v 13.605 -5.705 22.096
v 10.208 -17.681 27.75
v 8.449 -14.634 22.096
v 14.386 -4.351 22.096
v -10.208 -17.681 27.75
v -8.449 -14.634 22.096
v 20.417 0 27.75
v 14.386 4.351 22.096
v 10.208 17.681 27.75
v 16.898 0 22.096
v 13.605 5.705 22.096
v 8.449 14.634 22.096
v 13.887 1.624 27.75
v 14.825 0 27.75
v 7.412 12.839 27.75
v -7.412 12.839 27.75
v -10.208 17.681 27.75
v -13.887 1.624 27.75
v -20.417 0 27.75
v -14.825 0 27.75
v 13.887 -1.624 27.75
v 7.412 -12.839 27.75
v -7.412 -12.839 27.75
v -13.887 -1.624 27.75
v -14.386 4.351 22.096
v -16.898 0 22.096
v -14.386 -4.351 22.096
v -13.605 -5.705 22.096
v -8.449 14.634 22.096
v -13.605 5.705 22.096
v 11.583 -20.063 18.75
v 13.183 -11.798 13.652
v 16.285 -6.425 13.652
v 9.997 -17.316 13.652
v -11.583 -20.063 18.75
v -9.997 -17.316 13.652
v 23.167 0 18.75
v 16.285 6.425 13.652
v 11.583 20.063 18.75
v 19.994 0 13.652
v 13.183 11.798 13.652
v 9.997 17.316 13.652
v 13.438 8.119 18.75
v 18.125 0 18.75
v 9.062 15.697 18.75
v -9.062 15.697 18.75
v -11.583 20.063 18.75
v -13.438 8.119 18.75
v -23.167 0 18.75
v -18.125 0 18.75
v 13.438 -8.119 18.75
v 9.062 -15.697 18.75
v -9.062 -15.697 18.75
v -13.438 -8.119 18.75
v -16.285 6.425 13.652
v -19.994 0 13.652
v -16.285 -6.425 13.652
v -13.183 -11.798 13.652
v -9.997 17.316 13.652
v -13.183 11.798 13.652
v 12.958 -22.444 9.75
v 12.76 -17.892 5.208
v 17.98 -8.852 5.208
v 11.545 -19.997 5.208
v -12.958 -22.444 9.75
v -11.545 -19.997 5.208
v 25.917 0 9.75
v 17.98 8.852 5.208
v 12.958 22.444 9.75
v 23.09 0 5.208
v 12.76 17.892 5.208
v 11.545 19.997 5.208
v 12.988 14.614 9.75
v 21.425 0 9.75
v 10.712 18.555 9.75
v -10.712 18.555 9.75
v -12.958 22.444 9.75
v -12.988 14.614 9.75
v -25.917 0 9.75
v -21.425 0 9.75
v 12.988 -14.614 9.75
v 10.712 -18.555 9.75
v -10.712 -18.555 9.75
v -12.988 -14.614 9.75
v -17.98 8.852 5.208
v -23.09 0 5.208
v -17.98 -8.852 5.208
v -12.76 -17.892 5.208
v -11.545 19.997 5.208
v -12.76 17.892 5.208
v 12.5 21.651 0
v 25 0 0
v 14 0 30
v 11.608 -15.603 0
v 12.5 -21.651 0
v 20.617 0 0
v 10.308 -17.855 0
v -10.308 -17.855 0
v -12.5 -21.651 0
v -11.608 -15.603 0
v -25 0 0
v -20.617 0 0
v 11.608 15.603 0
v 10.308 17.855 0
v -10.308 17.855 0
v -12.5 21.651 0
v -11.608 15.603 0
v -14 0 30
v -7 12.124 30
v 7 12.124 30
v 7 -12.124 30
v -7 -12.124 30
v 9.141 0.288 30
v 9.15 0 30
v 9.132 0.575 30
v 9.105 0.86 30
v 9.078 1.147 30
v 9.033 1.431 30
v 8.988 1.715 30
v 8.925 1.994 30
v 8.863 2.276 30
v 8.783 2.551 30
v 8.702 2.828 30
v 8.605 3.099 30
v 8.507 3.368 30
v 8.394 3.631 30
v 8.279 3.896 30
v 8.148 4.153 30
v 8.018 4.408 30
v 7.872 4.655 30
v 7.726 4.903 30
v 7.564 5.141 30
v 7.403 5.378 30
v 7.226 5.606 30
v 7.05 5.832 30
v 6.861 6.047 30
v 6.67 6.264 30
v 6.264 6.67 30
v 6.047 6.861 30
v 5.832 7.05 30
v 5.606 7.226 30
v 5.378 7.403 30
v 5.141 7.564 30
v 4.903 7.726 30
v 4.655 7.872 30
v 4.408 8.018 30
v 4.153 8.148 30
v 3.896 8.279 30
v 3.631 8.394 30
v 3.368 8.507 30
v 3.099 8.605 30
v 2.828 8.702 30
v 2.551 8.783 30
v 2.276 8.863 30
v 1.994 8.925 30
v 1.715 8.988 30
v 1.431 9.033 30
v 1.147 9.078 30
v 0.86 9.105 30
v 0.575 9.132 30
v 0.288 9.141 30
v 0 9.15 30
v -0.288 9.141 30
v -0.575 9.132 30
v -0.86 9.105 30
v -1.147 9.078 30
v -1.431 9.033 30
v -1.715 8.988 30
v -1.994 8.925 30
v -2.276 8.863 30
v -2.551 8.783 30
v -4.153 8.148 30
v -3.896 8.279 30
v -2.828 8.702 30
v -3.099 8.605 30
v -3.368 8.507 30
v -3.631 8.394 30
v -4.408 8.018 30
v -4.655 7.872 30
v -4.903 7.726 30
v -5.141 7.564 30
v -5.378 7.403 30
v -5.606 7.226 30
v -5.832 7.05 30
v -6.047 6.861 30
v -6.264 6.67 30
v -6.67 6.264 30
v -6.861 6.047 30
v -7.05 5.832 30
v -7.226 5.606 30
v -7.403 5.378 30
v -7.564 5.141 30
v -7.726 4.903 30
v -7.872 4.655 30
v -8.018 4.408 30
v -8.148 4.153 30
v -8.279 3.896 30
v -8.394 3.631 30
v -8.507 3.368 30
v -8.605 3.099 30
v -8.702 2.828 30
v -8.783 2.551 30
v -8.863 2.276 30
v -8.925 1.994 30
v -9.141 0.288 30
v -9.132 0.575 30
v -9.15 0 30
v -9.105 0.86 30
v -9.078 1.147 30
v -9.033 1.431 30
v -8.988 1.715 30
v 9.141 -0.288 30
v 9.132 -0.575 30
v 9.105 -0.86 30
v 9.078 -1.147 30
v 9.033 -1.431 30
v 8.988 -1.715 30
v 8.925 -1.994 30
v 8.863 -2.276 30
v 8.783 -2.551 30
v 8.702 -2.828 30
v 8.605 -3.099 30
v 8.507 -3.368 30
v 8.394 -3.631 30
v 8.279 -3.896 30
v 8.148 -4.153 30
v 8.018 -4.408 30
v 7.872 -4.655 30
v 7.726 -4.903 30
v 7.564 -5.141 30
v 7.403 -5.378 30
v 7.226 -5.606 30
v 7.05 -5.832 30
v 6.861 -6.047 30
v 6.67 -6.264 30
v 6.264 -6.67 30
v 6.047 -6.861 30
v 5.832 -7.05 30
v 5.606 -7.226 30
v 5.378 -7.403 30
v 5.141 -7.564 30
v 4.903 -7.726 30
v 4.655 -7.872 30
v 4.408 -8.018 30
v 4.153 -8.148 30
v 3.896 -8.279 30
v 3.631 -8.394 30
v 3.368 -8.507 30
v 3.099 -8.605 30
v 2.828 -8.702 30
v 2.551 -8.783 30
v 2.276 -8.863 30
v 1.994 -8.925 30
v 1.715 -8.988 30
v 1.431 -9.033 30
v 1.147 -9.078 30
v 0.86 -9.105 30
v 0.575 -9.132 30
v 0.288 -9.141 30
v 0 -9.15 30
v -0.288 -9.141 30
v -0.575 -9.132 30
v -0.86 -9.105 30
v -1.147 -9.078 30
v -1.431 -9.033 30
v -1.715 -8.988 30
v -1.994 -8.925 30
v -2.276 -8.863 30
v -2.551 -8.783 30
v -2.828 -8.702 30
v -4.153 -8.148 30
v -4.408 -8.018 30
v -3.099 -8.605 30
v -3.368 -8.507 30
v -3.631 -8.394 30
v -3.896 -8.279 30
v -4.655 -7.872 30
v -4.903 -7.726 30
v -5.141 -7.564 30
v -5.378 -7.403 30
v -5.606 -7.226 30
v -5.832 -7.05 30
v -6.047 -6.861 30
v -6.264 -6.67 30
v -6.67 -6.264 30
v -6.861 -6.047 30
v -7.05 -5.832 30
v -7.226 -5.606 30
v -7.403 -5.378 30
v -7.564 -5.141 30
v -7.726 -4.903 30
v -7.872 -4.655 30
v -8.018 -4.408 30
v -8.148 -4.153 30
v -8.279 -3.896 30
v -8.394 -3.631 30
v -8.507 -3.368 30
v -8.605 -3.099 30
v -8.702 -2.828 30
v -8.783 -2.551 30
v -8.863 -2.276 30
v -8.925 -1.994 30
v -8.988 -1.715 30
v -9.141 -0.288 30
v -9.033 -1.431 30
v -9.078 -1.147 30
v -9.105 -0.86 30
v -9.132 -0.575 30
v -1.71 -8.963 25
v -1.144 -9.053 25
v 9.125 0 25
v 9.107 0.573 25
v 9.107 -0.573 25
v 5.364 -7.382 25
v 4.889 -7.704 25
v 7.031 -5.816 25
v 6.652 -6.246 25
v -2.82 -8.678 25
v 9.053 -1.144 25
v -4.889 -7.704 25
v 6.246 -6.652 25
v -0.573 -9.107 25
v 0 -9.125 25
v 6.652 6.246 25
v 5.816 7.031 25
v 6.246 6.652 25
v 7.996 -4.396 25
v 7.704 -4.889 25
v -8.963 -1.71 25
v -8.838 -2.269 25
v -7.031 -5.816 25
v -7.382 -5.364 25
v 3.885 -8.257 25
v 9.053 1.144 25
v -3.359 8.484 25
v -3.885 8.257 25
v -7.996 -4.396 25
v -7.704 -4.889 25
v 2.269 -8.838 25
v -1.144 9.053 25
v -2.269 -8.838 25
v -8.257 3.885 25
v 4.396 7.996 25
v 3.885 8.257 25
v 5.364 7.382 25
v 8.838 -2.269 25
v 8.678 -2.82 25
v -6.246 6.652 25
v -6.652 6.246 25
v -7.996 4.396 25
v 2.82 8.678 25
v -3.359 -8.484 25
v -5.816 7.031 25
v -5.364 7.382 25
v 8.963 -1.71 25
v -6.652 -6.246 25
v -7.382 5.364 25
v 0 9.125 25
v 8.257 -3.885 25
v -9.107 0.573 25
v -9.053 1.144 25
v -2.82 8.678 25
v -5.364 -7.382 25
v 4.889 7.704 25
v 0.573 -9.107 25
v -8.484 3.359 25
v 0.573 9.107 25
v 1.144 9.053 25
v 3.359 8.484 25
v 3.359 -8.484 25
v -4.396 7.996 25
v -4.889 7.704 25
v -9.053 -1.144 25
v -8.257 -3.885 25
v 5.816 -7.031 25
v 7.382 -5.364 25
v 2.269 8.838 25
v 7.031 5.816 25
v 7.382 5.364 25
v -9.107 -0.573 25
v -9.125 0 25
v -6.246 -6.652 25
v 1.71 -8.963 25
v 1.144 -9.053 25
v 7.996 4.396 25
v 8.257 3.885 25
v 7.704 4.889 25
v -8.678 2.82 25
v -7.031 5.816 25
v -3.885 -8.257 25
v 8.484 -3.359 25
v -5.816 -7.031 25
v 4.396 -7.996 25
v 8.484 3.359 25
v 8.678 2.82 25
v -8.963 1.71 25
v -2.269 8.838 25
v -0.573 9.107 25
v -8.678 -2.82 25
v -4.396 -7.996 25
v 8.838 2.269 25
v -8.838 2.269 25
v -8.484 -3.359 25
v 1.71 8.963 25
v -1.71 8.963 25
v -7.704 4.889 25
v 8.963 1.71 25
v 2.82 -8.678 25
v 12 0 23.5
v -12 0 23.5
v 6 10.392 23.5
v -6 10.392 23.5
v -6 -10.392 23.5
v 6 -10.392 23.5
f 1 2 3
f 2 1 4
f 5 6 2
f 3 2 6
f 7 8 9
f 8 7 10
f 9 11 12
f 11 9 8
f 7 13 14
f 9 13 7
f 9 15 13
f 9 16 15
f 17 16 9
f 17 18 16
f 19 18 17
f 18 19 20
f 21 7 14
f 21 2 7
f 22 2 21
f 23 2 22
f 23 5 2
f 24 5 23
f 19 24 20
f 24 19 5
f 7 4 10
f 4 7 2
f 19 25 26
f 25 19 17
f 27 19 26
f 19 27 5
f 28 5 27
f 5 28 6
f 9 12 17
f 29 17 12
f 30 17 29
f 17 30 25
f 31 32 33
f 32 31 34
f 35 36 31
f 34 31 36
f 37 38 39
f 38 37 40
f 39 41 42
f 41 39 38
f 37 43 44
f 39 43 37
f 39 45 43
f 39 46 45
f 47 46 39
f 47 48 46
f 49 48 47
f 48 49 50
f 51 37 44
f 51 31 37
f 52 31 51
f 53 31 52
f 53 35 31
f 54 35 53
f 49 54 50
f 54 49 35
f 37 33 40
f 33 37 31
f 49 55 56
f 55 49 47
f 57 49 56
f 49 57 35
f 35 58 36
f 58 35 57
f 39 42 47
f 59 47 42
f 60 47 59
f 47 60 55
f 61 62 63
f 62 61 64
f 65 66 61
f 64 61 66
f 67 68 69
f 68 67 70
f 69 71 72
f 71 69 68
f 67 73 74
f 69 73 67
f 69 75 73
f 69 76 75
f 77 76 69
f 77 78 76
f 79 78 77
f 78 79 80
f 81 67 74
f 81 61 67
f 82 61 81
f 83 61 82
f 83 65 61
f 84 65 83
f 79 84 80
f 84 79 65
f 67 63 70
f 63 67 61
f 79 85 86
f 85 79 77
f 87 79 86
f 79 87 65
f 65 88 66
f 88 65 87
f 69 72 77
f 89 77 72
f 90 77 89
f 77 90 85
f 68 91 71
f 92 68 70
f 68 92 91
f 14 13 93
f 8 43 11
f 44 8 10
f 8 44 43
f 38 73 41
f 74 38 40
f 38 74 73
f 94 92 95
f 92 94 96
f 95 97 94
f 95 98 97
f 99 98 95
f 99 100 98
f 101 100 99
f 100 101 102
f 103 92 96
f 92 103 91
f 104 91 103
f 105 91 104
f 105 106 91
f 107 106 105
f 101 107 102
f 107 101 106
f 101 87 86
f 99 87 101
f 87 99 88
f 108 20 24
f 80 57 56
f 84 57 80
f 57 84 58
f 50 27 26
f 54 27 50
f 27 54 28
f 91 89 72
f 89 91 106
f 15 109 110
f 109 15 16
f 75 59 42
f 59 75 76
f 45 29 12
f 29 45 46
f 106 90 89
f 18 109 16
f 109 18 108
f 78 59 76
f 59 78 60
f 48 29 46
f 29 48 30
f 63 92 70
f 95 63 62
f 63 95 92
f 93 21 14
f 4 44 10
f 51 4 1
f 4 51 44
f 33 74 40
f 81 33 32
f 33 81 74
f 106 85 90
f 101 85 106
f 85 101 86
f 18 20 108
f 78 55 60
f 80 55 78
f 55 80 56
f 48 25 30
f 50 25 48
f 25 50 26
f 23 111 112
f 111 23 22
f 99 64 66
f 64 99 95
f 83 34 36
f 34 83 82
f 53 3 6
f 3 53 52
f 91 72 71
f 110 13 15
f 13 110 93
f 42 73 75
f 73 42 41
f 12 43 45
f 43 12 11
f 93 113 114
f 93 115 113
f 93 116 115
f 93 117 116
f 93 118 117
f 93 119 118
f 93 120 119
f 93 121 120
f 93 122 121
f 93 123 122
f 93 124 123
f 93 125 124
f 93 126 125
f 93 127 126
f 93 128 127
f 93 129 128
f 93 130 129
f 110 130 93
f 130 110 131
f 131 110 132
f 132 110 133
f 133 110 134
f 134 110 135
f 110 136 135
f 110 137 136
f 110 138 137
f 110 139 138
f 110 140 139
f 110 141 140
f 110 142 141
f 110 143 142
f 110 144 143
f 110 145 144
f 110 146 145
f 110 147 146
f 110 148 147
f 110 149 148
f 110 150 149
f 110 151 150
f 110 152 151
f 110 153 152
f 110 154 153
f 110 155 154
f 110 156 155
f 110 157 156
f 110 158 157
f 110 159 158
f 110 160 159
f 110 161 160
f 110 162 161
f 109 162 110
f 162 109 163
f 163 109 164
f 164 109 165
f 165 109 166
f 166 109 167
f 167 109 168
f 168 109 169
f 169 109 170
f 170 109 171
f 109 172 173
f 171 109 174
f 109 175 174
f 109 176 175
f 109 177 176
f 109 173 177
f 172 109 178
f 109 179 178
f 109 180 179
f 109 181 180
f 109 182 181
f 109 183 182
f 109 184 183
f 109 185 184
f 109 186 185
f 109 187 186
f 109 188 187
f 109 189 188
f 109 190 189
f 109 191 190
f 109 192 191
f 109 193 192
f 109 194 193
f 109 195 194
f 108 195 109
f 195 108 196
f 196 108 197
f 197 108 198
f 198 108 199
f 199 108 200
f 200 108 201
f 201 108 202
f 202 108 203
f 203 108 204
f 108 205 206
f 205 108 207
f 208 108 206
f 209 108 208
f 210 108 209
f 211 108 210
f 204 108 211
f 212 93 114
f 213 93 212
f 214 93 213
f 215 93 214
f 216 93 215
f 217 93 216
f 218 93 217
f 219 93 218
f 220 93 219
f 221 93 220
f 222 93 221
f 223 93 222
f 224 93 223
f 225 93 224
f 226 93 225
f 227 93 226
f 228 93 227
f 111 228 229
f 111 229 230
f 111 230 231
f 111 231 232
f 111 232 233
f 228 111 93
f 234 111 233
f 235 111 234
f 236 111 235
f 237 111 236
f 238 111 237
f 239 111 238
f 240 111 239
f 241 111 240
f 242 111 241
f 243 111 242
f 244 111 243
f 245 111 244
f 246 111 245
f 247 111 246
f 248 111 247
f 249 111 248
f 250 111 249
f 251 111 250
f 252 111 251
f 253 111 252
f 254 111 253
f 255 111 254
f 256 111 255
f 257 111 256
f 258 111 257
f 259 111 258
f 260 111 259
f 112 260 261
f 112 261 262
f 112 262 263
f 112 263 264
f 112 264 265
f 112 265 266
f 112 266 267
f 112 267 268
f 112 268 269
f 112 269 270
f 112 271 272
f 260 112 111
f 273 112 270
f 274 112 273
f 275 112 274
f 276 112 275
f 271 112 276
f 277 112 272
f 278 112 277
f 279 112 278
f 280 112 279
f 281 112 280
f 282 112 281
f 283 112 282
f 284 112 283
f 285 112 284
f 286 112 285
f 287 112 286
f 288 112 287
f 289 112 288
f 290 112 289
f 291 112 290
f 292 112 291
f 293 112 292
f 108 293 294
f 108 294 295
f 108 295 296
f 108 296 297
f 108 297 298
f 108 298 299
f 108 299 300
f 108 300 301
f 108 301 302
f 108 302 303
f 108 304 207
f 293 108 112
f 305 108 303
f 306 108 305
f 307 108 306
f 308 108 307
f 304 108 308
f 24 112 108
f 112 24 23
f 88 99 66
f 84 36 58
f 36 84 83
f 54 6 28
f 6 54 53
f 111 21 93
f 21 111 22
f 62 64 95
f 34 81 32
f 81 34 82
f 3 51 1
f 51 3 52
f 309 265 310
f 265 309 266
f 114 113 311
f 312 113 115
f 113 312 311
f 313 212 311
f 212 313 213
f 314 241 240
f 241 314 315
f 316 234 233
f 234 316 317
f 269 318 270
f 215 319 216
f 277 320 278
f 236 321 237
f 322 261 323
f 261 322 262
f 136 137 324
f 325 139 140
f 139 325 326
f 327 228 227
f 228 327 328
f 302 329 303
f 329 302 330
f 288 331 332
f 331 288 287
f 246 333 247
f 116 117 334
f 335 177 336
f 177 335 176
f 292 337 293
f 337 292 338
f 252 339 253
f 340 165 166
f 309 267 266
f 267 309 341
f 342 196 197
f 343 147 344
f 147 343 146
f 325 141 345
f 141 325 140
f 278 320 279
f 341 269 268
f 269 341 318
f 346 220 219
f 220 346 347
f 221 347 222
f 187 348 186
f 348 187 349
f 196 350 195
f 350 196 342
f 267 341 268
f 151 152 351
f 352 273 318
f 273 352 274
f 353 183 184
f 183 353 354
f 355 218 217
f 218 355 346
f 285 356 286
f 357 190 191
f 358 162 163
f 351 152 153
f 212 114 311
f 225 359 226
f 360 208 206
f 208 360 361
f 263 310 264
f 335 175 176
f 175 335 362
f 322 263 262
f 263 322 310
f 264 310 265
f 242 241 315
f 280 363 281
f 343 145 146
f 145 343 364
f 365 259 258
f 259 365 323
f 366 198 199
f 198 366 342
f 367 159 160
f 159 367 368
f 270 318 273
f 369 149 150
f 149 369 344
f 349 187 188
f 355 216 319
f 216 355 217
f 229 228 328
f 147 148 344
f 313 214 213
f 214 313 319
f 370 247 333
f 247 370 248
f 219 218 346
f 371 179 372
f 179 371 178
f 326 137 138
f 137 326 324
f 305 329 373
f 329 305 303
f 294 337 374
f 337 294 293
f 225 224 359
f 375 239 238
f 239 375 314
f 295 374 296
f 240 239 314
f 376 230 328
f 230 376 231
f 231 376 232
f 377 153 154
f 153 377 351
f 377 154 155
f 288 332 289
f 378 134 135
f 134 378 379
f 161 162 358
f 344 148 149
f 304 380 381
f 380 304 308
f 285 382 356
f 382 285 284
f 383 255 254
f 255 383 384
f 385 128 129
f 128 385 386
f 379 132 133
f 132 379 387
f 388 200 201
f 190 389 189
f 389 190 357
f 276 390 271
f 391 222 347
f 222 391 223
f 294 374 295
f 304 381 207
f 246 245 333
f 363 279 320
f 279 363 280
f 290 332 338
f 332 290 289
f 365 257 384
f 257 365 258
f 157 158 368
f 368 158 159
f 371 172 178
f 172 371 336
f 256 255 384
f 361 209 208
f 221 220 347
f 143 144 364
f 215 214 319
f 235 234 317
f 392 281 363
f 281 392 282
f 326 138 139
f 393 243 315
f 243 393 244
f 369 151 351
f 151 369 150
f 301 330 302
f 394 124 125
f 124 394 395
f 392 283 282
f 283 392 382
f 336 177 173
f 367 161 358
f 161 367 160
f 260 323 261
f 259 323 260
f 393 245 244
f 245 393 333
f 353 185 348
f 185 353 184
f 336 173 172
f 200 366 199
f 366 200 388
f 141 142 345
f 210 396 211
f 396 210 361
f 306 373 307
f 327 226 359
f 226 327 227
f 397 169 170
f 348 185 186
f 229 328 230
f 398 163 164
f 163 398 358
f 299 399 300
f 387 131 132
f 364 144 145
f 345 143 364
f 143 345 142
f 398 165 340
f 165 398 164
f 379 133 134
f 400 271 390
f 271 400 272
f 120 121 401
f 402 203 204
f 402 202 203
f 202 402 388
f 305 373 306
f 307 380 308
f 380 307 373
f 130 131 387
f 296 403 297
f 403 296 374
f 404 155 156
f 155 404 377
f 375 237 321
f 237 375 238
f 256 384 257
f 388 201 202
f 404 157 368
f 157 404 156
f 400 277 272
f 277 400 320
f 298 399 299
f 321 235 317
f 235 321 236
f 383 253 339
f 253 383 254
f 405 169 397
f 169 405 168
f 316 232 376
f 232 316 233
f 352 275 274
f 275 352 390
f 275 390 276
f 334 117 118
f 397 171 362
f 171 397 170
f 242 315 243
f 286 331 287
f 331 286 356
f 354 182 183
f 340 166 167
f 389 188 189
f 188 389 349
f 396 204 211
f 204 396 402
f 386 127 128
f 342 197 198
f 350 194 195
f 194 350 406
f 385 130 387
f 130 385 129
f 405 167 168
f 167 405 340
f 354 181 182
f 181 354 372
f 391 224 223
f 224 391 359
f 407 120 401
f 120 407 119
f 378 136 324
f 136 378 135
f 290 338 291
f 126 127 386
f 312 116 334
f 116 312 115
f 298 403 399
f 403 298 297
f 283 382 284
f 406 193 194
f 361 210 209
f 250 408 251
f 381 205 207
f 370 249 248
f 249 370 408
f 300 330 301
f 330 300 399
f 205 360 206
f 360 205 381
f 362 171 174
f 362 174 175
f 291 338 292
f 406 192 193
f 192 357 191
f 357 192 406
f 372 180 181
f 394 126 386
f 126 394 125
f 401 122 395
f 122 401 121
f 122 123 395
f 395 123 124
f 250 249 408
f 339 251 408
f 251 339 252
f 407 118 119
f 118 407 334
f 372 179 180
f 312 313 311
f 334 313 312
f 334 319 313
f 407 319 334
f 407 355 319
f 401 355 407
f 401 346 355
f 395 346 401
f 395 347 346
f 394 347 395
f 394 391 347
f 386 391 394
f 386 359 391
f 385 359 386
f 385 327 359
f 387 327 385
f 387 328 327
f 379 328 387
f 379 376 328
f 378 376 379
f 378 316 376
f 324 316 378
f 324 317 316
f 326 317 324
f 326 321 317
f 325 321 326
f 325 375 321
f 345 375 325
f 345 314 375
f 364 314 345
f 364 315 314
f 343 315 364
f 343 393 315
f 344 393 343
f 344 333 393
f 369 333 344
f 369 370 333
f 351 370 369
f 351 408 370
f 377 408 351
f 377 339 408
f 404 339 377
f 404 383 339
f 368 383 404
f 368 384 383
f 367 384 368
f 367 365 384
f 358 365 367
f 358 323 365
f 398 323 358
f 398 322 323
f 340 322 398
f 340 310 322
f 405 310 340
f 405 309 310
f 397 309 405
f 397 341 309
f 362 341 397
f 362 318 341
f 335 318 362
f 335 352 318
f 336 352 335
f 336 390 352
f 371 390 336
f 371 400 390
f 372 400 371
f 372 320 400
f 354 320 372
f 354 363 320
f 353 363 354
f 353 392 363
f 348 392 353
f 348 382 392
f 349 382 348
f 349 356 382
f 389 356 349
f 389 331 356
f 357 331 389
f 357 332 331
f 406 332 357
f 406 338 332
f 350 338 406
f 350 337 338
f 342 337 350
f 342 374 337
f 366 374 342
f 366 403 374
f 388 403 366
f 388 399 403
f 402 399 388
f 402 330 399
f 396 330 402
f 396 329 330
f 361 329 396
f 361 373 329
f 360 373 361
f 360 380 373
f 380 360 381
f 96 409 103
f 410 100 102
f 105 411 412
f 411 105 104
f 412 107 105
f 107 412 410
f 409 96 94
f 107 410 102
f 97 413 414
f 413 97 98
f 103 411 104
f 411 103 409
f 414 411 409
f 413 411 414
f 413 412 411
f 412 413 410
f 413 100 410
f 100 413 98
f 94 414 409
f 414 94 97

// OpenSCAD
// [FL_INDEX: keywords="openscad, 3d_parametric, LED_Kerzenhalter_-_LED_Candle_holder_-_Customizable, csg_solid" | COT="Parametric OpenSCAD design from 3DCodeverse"]
// Title: LED Kerzenhalter - LED Candle holder - Customizable

//$fn=6;
//$fn=9;
//$fn=12;
//$fn=24;
//$fn=100;

// Ecken vom Halter - Corners of the holder
halterecken=6; // [3:100]


// Durchmesser des Lochs für die Kerze oben - Diameter of the hole for the candle above
durchmesserkerzeoben=18.35;

// Durchmesser des Lochs für die Kerze unten - Diameter of the hole for the candle below
durchmesserkerzeunten=18.25;

// Tiefe des Lochs für die Kerze - Depth of the hole for the candle
lochkerze=5;

// Durchmesser vom Halter oben - Diameter of the holder above
durchmesserhalteroben=28;

// Durchmesser vom Halter unten - Diameter of the holder below
durchmesserhalterunten=50;

// Höhe vom Halter - Height from holder
halterhoehe=30;

// Ringe - rings ?
halterrige=1; // [1:ja - yes,0:nein - no]


translate([0,0,0]) staender(durchmesserhalterunten,durchmesserhalteroben,halterhoehe,halterrige,halterecken);


/*
translate([0,0,0]) staender(50,25,50,0,16);

translate([0,28,0]) staender(15,25,30,0,32);
translate([28,0,0]) staender(15,25,30,0,32);
translate([-28,0,0]) staender(15,25,30,0,32);
translate([0,-28,0]) staender(15,25,30,0,32);

translate([0,50,0]) staender(45,40,10,1,16);
translate([50,0,0]) staender(45,40,10,1,16);
translate([-50,0,0]) staender(45,40,10,1,16);
translate([0,-50,0]) staender(45,40,10,1,16);
*/
/*
FAV
translate([-50,14,0]) staender(35,25,30,0);
translate([-74,0,0]) staender(35,25,20,0);
translate([-50,-14,0]) staender(35,25,40,0);

translate([0,0,0]) staender(45,30);
*/



/*
translate([-50,14,0]) staender(35,25,30,0);
translate([-74,0,0]) staender(35,25,20,0);
translate([-50,-14,0]) staender(35,25,40,0);


translate([0,0,0]) staender(30);
translate([50,0,0]) staender(35);
translate([50,50,0]) staender(45,30);
translate([0,50,0]) staender(45,35);
translate([50,100,0]) staender(40,30,20,0);
translate([0,100,0]) staender(45,35,20,0);
*/

module staender(unten=30, oben=25, hoehe=20, ringe=1, $fn=6) {
translate([0,0,hoehe/2]) {
color("green") {
difference() {
union() {
cylinder(r1=unten/2,r2=oben/2,h=hoehe,center=true);

if(ringe==1) {
translate([0,0,hoehe*0.3]) cylinder(r1=(((unten-oben)*0.25)+oben)/2-1,r2=(((unten-oben)*0.25)+oben)/2+(unten-oben)/6,h=hoehe/4,center=true);

translate([0,0,0]) cylinder(r1=(((unten-oben)*0.5)+oben)/2-1,r2=(((unten-oben)*0.5)+oben)/2+(unten-oben)/6,h=hoehe/4,center=true);

translate([0,0,-hoehe*0.3]) cylinder(r1=(((unten-oben)*0.75)+oben)/2-1,r2=(((unten-oben)*0.75)+oben)/2+(unten-oben)/6,h=hoehe/4,center=true);
}
}
translate([0,0,hoehe/2]) cylinder(r1=durchmesserkerzeunten/2,r2=durchmesserkerzeoben/2,h=lochkerze*2,center=true,$fn=100);
translate([0,0,-lochkerze-1.5]) cylinder(r1=unten/2-2,r2=oben/2-2,h=hoehe,center=true);
}
}
}
}
